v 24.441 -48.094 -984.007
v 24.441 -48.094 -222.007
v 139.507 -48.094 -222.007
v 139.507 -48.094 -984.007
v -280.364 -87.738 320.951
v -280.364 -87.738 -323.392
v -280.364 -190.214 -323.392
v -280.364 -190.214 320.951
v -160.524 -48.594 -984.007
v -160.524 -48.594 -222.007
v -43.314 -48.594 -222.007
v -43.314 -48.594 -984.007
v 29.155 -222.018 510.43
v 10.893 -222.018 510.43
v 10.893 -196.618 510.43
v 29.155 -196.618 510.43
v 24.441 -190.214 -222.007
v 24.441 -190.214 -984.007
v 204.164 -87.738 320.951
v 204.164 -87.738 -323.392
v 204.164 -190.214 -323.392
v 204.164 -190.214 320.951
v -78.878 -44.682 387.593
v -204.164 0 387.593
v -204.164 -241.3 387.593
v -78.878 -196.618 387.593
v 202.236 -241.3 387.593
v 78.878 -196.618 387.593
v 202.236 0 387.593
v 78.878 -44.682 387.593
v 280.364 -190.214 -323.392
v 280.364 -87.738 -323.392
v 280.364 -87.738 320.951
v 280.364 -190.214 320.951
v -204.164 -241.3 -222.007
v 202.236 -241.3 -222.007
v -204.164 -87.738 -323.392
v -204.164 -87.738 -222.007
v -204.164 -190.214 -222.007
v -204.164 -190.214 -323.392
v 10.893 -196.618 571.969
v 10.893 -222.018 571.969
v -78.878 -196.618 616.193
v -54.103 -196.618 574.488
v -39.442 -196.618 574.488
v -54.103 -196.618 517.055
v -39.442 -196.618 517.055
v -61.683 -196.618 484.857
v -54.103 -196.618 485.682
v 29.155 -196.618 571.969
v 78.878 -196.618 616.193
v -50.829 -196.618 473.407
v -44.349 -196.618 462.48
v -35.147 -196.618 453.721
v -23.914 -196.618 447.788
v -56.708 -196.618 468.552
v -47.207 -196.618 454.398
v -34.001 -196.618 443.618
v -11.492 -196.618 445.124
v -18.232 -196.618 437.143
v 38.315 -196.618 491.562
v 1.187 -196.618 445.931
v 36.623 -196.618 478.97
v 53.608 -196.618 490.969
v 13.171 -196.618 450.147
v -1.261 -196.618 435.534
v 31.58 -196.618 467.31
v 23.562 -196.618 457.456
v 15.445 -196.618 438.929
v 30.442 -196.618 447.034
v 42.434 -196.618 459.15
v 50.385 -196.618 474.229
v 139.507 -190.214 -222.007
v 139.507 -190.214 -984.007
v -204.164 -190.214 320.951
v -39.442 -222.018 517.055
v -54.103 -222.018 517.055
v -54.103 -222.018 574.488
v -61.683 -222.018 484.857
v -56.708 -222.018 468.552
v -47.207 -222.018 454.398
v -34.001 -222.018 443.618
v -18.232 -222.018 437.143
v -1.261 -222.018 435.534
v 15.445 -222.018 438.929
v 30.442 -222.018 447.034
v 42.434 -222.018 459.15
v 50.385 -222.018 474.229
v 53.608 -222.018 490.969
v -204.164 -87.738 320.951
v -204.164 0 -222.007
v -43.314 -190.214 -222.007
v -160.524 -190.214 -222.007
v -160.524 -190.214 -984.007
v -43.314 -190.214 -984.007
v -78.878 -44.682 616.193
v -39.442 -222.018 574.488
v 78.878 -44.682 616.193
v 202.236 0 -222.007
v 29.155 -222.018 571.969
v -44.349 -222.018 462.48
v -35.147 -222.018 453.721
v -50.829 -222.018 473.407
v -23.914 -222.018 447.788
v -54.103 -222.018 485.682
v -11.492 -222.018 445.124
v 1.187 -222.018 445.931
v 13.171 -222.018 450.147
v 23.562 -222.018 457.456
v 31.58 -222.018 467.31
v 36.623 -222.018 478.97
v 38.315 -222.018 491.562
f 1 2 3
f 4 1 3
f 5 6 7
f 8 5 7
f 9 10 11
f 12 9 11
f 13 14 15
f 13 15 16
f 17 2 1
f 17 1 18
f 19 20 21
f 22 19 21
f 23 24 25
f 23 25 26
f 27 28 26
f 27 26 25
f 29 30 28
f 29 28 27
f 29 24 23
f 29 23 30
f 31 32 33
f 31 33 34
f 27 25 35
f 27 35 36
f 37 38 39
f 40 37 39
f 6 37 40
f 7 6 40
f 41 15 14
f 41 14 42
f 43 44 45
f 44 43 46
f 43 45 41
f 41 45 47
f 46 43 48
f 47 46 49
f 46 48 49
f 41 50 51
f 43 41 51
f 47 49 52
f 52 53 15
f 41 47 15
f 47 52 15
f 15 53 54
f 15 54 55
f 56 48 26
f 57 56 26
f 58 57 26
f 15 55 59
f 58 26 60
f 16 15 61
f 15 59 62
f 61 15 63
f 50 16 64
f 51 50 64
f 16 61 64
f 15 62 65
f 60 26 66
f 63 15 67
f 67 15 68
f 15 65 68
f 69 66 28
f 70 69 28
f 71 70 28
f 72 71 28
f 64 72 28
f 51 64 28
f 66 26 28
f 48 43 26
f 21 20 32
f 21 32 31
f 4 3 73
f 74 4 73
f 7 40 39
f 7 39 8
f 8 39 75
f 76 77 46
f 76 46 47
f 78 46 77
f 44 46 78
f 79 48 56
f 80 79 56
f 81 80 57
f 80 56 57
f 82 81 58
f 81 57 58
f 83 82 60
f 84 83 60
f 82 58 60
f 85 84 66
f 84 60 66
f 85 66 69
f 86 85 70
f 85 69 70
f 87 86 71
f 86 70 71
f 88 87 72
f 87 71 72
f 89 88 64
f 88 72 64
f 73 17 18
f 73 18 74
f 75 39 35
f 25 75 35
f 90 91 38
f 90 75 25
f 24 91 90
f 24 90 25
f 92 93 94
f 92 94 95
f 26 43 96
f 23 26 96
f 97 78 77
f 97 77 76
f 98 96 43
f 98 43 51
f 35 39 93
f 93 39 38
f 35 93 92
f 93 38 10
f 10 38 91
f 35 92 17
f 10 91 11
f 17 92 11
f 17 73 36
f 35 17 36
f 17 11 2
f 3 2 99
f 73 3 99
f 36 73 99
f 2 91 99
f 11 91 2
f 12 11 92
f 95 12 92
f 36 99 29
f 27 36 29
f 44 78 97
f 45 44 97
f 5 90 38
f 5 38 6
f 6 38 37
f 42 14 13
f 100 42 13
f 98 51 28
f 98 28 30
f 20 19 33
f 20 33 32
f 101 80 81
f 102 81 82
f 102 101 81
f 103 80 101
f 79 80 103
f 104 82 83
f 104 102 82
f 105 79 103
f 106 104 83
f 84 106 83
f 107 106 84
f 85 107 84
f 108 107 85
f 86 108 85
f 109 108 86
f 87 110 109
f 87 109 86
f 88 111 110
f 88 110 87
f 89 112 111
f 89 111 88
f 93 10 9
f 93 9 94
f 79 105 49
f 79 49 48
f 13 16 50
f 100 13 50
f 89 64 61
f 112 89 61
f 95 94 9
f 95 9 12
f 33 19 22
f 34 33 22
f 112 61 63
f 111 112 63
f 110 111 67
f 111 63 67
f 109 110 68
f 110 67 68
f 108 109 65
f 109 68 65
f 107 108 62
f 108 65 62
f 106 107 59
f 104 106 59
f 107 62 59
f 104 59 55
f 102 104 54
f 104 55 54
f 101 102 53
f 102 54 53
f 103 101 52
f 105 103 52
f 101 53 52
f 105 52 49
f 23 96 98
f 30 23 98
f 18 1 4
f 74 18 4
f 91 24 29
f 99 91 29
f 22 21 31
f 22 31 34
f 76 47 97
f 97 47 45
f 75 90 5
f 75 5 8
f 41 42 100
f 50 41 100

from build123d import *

# Parameters (mm, degrees)
F0_W     = 406.4
F0_H     = 609.6
F1_DEPTH = 241.3
F2_W     = 157.7554345131
F2_H     = 151.9362496853
F3_DEPTH = 228.6
F4_W     = 102.4757102132
F4_H     = 542.9573820229
F4_H_2   = 101.385278881
F5_DEPTH = 76.2
F6_W     = 117.2105111182
F6_H     = 141.6197903454
F6_W_2   = 115.0653380901
F6_H_2   = 142.1200931072
F7_DEPTH = 762
F8_W     = 14.6603360772
F8_H     = 57.432115078
F8_W_2   = 18.2616543025
F8_H_2   = 61.538875103
F9_DEPTH = 25.4


# Not quite as in the source:
# - a pattern or mirror of a feature is missing from the dataset's text; its kind, count and spacing are read off the source's solid


with BuildPart() as f1:
    # F0 (on Front) → F1 (new body)
    with BuildSketch(Plane.XZ):
        with Locations((-0.9644478559, 82.7934837226)):
            Rectangle(F0_W, F0_H)
    extrude(amount=F1_DEPTH)

    # F2 (on face) → F3 (join)
    with BuildSketch(Plane.XY.offset(387.5934837226)):
        with Locations((0, -120.65)):
            Rectangle(F2_W, F2_H)
    extrude(amount=F3_DEPTH)

    # F4 (on face) → F5 (join)
    with BuildSketch(Plane(origin=(-204.1644478559, 0, 0), x_dir=(0, -1, 0), z_dir=(-1, 0, 0))):
        with Locations((138.9757506549, 49.4721747341)):
            Rectangle(F4_W, F4_H)
        with Locations((138.9757506549, -272.6991557179)):
            Rectangle(F4_W, F4_H_2)
    f5 = extrude(amount=F5_DEPTH)

    # F5_copies: F5 across plane
    add(f5.mirror(Plane(origin=(0, 0, 0), x_dir=(0, 0, 1), z_dir=(1, 0, 0))))

    # F6 (on face) → F7 (join)
    with BuildSketch(Plane(origin=(0, 0, -222.0065162774), x_dir=(1, 0, 0), z_dir=(0, 0, -1))):
        with Locations((-101.9190382212, 119.4037105888)):
            Rectangle(F6_W, F6_H)
        with Locations((81.9740435109, 119.1535592079)):
            Rectangle(F6_W_2, F6_H_2)
    extrude(amount=F7_DEPTH)

    # F8 (on face) → F9 (join)
    with BuildSketch(Plane.XZ.offset(196.6181248426)):
        with Locations((-46.77233845, 545.7714498043)):
            Rectangle(F8_W, F8_H)
        with Locations((20.0242409483, 541.19977355)):
            Rectangle(F8_W_2, F8_H_2)
        with BuildLine():
            Line((-54.1025064886, 485.6823980808), (-61.6828501225, 484.8566651344))
            ThreePointArc((-61.6828501225, 484.8566651344), (-1.2605522205, 435.5338821249), (53.6077916622, 490.9690320492))
            Line((53.6077916622, 490.9690320492), (38.3146069944, 491.5615320206))
            ThreePointArc((38.3146069944, 491.5615320206), (-5.1247496202, 445.0914918544), (-54.1025064886, 485.6823980808))
        make_face()
    extrude(amount=F9_DEPTH)


solid = f1.part
